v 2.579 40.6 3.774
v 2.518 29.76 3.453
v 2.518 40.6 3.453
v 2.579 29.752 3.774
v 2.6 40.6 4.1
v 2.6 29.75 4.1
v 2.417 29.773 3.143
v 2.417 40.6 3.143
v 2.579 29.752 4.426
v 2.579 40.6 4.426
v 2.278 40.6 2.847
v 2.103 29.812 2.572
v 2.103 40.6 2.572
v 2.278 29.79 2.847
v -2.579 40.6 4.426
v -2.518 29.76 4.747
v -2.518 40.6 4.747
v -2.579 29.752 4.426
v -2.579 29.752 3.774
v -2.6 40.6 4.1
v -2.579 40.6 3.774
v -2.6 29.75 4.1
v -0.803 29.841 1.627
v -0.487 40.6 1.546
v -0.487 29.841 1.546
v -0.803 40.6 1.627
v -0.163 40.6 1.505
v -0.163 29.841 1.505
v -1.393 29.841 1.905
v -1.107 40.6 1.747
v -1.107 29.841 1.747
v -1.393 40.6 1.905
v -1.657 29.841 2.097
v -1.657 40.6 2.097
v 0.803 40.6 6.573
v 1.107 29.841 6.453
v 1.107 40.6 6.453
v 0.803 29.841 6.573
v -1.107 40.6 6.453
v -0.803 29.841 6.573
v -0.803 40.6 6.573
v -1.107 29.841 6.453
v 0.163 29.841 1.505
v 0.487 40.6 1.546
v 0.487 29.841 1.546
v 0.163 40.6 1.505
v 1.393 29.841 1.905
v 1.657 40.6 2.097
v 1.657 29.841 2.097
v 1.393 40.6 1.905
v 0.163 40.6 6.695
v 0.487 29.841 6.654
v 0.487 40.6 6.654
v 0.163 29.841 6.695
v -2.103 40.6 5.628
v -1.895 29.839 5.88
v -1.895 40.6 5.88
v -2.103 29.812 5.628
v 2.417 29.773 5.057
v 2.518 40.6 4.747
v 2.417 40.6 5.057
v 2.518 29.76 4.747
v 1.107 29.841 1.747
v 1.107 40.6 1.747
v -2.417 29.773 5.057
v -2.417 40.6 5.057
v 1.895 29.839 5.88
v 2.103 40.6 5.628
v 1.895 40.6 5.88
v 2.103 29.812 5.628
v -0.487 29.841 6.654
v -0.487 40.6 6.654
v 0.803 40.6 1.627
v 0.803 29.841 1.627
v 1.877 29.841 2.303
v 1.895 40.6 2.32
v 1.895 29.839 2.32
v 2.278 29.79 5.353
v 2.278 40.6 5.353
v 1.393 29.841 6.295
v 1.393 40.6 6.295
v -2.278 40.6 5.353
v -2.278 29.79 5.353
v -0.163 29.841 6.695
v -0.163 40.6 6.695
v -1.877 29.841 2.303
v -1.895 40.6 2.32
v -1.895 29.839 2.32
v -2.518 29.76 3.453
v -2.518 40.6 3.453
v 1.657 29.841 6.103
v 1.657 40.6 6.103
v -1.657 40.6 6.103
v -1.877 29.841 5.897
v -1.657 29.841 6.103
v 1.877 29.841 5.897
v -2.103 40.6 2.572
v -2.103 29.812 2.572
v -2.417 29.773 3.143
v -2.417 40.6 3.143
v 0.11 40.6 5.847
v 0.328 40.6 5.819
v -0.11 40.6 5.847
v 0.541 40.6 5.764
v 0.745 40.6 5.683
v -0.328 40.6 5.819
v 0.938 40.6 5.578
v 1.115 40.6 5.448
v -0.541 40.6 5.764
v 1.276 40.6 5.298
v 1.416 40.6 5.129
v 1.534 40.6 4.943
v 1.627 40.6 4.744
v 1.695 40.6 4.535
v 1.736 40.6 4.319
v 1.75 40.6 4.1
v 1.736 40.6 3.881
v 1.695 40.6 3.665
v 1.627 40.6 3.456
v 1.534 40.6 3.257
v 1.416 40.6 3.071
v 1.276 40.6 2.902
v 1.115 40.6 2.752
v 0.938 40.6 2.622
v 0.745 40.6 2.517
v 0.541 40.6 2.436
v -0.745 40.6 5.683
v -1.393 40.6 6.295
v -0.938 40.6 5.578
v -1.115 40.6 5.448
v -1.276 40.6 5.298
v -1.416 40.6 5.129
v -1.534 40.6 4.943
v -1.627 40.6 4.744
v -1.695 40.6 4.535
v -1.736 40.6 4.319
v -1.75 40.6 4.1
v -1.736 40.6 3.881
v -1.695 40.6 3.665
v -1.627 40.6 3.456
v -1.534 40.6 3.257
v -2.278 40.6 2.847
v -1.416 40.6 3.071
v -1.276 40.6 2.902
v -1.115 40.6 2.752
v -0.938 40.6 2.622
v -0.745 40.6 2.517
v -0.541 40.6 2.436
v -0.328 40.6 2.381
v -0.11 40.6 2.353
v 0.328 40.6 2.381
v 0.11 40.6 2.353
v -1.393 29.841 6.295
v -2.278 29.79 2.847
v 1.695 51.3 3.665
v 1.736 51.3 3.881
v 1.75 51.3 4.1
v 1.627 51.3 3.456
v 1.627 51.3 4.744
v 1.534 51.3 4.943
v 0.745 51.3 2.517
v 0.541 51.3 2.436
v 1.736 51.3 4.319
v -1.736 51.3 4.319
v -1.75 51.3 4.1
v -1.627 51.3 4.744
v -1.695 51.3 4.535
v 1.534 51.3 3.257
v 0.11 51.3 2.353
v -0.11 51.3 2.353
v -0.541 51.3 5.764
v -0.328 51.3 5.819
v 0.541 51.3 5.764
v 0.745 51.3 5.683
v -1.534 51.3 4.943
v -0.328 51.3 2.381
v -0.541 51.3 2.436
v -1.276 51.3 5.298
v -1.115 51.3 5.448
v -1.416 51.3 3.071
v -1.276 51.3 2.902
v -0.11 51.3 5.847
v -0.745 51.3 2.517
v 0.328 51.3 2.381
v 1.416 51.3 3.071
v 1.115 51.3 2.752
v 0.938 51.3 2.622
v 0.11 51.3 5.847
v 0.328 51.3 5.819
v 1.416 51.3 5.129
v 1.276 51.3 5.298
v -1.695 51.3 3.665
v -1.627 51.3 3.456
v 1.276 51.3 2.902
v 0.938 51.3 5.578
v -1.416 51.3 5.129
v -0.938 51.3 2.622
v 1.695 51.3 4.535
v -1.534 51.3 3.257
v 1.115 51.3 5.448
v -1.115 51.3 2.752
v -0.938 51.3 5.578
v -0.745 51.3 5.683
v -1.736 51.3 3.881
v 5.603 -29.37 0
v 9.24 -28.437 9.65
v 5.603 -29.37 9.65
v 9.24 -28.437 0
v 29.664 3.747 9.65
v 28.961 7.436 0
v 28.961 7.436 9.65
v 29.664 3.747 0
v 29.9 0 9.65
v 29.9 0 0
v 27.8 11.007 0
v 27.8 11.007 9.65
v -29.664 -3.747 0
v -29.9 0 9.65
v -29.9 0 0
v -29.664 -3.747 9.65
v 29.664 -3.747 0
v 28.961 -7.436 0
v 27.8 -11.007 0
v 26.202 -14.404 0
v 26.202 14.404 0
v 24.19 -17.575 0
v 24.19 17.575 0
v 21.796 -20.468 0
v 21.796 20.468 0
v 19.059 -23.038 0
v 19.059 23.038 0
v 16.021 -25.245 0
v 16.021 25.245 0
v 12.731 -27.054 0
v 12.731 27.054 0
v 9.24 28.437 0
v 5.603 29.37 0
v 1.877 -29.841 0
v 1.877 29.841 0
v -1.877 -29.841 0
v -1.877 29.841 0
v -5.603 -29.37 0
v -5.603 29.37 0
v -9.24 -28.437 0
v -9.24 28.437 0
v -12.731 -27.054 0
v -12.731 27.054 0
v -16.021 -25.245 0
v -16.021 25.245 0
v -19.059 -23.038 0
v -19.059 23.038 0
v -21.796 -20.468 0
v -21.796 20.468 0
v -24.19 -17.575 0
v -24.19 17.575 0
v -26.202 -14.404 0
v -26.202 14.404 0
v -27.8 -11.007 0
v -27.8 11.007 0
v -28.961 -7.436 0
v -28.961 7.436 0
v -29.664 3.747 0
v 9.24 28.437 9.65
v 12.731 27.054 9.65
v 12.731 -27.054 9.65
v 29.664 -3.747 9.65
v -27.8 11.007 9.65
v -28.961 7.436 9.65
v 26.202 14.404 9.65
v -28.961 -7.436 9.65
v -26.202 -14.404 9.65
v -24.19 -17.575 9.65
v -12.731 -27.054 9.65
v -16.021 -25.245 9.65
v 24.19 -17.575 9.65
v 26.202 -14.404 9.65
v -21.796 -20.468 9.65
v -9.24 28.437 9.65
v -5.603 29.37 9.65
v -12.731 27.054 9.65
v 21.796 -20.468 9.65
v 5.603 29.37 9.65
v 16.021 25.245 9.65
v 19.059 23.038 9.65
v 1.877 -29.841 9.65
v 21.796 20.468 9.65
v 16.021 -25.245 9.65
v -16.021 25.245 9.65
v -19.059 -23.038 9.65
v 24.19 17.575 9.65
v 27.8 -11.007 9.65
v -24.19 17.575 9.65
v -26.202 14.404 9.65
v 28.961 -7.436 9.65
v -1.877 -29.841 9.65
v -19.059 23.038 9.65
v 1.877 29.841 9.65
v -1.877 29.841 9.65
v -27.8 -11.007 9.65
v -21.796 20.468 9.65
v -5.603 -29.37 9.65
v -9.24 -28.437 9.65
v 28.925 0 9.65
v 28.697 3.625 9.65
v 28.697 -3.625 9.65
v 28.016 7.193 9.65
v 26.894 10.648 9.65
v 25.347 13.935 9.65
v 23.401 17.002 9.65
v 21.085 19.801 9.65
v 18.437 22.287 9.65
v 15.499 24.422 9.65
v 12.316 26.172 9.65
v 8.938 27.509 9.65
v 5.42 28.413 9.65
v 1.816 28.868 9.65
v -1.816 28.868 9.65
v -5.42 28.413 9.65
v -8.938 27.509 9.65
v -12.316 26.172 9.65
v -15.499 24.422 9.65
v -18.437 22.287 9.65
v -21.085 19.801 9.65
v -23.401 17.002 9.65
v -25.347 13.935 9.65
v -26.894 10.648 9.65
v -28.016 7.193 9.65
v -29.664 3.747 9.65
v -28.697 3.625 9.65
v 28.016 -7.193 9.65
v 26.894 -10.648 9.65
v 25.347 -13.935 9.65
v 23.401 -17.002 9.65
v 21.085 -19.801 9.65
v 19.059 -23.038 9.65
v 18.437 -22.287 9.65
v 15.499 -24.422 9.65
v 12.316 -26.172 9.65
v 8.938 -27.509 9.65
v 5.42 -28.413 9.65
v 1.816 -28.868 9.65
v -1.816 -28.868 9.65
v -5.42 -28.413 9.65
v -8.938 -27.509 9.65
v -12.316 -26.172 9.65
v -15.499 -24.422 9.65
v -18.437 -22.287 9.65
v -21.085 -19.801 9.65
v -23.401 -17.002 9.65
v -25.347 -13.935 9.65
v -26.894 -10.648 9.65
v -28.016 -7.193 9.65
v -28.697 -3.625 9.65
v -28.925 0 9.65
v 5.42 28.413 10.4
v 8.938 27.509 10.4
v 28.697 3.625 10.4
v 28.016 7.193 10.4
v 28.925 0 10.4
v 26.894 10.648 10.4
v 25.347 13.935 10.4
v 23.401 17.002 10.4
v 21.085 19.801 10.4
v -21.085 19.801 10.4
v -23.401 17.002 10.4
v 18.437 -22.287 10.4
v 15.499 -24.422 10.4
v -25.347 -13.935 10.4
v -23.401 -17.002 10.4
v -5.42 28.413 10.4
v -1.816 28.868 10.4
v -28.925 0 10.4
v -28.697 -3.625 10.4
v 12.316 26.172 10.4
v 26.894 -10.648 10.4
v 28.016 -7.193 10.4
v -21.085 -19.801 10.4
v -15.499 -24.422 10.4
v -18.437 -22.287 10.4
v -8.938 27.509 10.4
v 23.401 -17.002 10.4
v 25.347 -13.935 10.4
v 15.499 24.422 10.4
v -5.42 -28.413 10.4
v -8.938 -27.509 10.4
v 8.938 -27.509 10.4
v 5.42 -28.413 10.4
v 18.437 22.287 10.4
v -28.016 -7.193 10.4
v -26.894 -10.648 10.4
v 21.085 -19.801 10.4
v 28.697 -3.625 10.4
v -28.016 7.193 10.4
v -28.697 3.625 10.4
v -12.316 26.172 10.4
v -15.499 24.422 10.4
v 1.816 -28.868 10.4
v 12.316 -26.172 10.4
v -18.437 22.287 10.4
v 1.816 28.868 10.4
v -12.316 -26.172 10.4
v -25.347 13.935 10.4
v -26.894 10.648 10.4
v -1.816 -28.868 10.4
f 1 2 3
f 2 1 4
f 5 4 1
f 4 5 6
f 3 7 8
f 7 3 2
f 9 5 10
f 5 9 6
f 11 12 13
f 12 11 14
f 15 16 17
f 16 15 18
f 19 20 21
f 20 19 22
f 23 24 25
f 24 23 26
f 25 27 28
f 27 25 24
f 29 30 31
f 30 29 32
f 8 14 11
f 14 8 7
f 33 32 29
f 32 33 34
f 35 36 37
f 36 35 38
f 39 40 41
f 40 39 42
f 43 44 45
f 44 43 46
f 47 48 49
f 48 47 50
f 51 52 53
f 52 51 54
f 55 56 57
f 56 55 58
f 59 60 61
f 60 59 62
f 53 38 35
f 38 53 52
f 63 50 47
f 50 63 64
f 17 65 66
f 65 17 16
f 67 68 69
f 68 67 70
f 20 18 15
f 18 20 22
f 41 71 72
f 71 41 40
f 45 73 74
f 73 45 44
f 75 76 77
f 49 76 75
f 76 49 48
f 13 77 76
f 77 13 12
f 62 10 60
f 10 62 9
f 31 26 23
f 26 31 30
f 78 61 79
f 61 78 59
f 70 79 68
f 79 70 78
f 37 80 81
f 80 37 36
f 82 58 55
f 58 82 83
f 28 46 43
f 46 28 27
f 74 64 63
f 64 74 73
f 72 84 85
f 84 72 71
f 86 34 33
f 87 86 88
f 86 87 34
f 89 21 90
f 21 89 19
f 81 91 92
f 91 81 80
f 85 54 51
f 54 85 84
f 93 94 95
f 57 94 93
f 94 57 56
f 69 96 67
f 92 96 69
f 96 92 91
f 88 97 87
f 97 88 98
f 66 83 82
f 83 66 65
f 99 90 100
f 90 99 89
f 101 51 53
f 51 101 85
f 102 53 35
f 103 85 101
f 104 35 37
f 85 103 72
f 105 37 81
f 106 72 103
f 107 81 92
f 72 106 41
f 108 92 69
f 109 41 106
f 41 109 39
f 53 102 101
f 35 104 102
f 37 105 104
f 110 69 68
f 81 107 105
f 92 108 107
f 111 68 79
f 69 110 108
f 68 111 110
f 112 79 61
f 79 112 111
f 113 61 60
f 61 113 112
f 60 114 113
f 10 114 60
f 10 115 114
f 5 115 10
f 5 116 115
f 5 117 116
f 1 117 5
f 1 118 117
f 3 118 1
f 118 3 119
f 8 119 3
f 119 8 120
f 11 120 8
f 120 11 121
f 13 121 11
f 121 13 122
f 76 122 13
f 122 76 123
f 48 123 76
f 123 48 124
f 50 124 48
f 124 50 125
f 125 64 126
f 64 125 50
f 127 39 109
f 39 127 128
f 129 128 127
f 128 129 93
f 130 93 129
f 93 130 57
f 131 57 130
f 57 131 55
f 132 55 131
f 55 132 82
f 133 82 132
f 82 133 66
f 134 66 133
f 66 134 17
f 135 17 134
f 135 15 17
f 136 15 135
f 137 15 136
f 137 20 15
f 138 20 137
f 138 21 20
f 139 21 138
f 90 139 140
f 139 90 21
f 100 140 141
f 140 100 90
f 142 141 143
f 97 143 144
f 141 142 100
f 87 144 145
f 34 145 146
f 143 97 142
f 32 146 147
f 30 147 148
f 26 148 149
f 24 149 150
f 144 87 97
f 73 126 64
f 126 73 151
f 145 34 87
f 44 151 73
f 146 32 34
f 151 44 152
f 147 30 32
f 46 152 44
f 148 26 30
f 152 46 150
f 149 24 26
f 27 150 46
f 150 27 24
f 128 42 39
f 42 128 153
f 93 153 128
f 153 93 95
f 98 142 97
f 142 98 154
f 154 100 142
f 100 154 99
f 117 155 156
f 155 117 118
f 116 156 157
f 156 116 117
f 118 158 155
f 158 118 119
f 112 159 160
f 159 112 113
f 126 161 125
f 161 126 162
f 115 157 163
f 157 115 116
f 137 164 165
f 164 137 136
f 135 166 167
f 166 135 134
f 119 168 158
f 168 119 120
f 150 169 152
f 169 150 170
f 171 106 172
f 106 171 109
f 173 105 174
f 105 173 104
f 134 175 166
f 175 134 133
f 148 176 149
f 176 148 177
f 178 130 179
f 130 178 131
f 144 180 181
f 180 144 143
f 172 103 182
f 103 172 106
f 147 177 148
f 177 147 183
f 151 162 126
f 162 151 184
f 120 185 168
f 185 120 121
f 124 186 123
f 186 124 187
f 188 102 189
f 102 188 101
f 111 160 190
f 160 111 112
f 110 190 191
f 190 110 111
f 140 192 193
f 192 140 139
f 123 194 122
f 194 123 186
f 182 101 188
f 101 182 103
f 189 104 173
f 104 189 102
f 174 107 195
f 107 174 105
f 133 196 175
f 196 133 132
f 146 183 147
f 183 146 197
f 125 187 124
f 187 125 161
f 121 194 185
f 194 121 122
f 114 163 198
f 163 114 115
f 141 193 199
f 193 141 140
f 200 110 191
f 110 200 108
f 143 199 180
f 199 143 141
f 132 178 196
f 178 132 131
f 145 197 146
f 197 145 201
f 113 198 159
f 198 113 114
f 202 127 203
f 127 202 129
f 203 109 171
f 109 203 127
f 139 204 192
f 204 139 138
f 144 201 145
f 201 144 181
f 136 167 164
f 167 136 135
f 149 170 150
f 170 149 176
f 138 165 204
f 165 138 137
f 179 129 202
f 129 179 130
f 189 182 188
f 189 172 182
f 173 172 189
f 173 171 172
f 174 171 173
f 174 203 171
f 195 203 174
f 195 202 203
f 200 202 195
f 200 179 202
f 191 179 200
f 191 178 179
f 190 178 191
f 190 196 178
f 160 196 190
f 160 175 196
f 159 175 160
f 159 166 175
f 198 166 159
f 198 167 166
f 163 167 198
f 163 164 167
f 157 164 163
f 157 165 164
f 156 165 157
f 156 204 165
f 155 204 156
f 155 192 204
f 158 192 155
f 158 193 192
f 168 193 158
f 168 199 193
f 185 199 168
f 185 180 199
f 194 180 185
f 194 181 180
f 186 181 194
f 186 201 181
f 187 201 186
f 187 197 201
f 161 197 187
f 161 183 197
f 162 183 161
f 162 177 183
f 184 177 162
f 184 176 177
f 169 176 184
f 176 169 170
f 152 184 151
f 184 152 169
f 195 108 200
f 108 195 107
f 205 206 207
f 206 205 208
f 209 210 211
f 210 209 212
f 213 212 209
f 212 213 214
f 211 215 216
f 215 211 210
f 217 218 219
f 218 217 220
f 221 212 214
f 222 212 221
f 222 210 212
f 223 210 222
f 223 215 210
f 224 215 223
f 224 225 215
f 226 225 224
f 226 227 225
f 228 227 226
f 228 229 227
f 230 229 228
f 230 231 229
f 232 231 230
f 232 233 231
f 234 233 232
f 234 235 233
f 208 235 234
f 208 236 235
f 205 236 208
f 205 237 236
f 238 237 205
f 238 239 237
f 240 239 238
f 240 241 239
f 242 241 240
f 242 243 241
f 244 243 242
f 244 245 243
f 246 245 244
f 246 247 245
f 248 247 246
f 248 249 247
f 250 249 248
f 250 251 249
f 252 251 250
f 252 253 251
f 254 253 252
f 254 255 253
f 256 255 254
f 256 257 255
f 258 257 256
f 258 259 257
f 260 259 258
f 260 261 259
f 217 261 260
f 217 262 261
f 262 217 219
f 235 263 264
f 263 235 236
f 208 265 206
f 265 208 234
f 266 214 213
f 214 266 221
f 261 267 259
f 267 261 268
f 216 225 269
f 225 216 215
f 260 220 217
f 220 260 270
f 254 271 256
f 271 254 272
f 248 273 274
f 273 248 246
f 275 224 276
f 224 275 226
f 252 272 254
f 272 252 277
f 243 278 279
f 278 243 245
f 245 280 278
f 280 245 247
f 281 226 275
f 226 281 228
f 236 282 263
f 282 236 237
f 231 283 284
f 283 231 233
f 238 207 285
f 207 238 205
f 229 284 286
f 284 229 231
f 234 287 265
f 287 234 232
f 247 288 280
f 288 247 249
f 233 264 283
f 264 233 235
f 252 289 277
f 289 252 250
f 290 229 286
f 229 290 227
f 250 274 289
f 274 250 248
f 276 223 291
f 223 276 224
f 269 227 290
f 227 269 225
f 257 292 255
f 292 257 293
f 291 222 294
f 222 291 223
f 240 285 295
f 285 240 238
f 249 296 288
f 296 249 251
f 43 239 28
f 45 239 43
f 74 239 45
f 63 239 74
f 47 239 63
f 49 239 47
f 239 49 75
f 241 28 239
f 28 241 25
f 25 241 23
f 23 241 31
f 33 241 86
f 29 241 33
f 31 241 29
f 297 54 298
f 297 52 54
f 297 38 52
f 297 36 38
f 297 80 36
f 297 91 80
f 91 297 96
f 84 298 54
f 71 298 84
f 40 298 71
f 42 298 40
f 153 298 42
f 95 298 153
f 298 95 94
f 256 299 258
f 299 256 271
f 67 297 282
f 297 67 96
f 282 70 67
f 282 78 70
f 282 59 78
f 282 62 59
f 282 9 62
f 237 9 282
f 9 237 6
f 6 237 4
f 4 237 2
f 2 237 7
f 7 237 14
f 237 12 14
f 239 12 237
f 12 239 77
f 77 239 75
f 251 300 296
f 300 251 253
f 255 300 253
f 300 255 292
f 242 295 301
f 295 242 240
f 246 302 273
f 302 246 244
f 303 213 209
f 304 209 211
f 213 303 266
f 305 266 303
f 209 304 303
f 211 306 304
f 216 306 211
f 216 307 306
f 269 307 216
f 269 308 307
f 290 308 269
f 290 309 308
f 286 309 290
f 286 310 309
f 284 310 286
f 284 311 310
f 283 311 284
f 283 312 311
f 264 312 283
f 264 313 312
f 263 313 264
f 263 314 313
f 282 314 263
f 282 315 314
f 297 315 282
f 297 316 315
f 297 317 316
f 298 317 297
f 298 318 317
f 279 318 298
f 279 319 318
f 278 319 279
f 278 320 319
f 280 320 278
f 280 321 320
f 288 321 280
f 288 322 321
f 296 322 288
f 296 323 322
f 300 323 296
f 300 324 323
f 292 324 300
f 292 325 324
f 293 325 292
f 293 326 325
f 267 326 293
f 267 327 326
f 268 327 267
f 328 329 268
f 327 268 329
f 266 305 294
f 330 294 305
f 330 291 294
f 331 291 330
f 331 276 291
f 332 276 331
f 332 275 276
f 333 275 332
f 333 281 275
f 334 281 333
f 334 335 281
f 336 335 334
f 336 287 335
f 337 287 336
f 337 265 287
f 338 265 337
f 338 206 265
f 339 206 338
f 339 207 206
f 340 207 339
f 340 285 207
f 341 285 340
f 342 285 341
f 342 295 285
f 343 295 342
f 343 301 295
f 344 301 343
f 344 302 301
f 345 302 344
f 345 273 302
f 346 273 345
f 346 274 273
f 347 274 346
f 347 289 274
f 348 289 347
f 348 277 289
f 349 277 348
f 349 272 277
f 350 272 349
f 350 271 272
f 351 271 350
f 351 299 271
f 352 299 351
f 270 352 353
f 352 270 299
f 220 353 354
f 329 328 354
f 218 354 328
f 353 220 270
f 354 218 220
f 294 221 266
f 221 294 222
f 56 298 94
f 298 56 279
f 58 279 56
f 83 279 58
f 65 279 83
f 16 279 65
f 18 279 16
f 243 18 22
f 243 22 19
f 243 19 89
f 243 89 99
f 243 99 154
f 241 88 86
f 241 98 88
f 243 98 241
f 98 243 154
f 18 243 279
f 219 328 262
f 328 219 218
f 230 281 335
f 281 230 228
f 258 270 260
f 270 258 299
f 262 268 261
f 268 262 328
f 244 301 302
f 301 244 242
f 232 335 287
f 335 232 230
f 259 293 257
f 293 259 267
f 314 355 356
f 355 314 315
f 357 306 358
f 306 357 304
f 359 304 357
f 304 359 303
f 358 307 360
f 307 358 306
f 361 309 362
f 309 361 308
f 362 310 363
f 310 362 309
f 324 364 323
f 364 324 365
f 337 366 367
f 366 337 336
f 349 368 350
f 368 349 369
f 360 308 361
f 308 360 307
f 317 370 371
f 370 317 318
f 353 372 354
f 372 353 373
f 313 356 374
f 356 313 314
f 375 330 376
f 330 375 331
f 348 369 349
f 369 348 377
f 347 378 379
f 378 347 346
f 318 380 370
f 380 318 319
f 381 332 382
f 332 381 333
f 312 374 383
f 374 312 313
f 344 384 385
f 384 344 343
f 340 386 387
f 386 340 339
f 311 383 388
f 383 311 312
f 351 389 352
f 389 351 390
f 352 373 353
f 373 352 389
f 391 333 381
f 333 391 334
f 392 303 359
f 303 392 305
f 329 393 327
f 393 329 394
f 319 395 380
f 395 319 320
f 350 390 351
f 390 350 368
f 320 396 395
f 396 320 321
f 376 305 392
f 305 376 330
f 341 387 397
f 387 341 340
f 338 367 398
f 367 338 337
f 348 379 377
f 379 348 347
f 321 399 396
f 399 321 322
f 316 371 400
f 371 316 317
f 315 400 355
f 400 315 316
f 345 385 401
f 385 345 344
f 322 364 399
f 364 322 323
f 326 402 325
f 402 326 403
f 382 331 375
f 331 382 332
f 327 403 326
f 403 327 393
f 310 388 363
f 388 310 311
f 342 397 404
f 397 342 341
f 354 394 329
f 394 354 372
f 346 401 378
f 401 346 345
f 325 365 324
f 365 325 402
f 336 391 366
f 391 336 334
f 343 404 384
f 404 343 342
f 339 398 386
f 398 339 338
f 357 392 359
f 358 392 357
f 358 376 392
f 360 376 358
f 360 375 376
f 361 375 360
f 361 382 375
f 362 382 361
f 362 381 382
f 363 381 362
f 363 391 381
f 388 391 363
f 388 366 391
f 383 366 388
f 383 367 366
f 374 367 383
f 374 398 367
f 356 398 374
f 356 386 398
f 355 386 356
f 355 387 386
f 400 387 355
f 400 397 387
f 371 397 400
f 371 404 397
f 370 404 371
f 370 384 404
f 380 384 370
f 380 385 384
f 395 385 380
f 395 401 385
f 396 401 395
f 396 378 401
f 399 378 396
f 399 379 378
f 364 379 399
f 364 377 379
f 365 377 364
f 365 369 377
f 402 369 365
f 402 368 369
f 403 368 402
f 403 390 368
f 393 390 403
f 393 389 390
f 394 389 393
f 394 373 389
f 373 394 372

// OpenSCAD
$fn=50;


AnkerMagSafe();

module AnkerMagSafe(){
  ovDia=59.8;
  ovThck=10.4;
  inDia=57.85;
  brimThck=0.75;
  cableDia=3.5;
  cableZOffset=6.7-5.2/2;
  strRelfLen=10.7; //strainRelief
  strRelfDia=5.2;
  
  
  
  //not forming the back slope atm
  cylinder(d=ovDia,h=ovThck-brimThck);
  cylinder(d=inDia,h=ovThck);
  //cable
  translate([0,0,cableZOffset]) rotate([-90,0,0]){
    cylinder(d=strRelfDia,h=ovDia/2+strRelfLen);
    cylinder(d=cableDia,h=ovDia/2+strRelfLen*2);
  }
}
